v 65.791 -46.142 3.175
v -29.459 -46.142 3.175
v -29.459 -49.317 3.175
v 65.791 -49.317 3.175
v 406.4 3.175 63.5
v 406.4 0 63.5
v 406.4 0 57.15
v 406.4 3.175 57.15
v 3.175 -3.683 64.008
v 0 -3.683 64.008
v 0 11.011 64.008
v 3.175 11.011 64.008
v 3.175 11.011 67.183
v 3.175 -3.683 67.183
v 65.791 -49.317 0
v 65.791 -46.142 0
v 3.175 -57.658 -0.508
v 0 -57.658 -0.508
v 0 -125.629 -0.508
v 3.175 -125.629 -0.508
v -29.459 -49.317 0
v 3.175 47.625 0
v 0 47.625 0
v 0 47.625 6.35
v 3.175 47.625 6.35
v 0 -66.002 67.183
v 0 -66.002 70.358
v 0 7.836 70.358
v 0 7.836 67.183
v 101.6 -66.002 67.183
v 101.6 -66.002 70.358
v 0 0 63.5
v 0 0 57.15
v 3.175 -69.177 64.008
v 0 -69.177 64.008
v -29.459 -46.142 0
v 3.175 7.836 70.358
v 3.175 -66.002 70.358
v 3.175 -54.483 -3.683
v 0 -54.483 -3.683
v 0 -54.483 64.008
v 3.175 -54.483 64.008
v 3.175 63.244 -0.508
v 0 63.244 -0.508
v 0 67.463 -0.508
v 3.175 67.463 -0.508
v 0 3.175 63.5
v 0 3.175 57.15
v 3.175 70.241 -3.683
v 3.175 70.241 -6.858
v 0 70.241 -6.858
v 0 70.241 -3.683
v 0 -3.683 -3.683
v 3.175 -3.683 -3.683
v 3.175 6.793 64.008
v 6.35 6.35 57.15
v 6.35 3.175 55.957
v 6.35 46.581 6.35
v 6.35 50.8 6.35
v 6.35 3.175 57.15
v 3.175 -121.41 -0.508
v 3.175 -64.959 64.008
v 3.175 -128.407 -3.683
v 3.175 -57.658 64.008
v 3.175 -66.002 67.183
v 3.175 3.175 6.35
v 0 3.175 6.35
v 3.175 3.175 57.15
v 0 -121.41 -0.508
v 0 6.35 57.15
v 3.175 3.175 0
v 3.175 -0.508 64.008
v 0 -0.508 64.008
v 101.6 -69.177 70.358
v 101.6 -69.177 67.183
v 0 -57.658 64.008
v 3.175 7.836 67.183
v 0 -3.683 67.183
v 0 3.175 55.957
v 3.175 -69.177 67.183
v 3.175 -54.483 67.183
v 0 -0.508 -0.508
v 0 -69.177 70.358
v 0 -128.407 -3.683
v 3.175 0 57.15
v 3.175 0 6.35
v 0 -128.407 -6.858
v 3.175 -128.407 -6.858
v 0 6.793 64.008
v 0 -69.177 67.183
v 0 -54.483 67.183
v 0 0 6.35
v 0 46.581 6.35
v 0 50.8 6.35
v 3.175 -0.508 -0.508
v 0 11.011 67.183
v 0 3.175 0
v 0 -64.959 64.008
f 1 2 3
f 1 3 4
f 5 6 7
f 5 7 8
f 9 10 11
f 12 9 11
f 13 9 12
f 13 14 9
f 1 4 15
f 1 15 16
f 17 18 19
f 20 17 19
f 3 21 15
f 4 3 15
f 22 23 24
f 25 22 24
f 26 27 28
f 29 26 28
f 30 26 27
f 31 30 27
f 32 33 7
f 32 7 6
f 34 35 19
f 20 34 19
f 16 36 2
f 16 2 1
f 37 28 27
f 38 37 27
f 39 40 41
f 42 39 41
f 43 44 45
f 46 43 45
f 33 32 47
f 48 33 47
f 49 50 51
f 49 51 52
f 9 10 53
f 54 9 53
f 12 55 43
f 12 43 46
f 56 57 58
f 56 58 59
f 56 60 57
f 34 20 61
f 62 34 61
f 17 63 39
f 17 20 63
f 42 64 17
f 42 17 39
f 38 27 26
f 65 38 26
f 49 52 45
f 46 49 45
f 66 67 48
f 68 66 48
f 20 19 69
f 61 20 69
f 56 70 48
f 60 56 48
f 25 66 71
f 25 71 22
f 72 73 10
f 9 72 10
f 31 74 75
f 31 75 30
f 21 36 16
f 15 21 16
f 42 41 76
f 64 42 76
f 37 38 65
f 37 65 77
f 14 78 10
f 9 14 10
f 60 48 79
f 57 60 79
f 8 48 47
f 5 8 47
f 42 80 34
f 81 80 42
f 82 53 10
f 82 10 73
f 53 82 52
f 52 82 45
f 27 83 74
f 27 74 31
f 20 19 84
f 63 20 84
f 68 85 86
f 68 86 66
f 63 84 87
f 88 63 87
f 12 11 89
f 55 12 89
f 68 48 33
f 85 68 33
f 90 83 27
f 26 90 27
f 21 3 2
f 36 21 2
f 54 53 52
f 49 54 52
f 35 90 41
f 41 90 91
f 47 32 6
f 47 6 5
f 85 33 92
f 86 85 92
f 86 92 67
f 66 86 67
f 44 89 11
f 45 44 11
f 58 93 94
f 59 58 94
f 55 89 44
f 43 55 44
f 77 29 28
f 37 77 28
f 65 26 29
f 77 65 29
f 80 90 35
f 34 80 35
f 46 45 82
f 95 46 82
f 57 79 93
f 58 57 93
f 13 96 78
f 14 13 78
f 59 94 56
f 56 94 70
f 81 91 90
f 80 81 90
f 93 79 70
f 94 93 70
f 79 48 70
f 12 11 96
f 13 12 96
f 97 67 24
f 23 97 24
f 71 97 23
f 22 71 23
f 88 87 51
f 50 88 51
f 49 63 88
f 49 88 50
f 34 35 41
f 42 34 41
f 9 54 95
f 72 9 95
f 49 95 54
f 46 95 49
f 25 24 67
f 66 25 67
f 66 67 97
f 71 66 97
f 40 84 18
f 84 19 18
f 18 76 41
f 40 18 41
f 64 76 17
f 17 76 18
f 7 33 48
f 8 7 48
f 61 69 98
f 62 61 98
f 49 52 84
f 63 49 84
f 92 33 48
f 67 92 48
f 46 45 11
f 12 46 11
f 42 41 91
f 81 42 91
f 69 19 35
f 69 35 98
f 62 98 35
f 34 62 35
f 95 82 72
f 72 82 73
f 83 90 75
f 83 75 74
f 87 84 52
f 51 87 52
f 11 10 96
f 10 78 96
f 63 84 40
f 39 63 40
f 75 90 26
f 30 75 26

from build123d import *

# Parameters (mm, degrees)
F1_DEPTH  = 3.175
F0_W      = 3.175
F0_H      = 6.35
F2_DEPTH  = 406.4
F3_DEPTH  = 3.175
F4_DEPTH  = 6.35
F6_DEPTH  = 3.175
F7_DEPTH  = 3.175
F8_DEPTH  = 3.175
F9_DEPTH  = 3.175
F10_DEPTH = 3.175
F5_W      = 3.175
F5_H      = 3.175
F11_DEPTH = 101.6
F12_W     = 95.25
F12_H     = 3.175
F13_DEPTH = 3.175


with BuildPart() as f1:
    # F0 (on Right) → F1 (new body)
    with BuildSketch(Plane.YZ):
        Polygon((0, 57.15), (0, 6.35), (3.175, 6.35), (3.175, 55.957041), (3.175, 57.15), align=None)
    extrude(amount=F1_DEPTH)


with BuildPart() as f2:
    # F0 (on Right) → F2 (new body)
    with BuildSketch(Plane.YZ):
        with Locations((1.5875, 60.325)):
            Rectangle(F0_W, F0_H)
    extrude(amount=F2_DEPTH)


with BuildPart() as f3:
    # F0 (on Right) → F3 (new body)
    with BuildSketch(Plane.YZ):
        Polygon((3.175, 6.35), (3.175, 0), (47.625, 0), (47.625, 6.35), (46.581161, 6.35), align=None)
    extrude(amount=F3_DEPTH)


with BuildPart() as f4:
    # F0 (on Right) → F4 (new body)
    with BuildSketch(Plane.YZ):
        Polygon((3.175, 55.957041), (46.581161, 6.35), (47.625, 6.35), (50.8, 6.35), (6.35, 57.15), (3.175, 57.15), align=None)
    extrude(amount=F4_DEPTH)


with BuildPart() as f6:
    # F5 (on face) → F6 (new body)
    with BuildSketch(Plane.YZ):
        Polygon((-3.683, 64.008), (-0.508, 64.008), (6.792539, 64.008), (11.011378, 64.008), (11.011378, 67.183), (7.836378, 67.183), (-3.683, 67.183), align=None)
        Polygon((-54.482988, 64.008), (-54.482988, 67.183), (-66.002366, 67.183), (-69.177366, 67.183), (-69.177366, 64.008), (-64.958527, 64.008), (-57.657988, 64.008), align=None)
    extrude(amount=F6_DEPTH)


with BuildPart() as f7:
    # F5 (on face) → F7 (new body)
    with BuildSketch(Plane.YZ):
        Polygon((70.241003, -3.683), (-3.683, -3.683), (-54.482988, -3.683), (-128.406991, -3.683), (-128.406991, -6.858), (70.241003, -6.858), align=None)
    extrude(amount=F7_DEPTH)


with BuildPart() as f8:
    # F5 (on face) → F8 (new body)
    with BuildSketch(Plane.YZ):
        Polygon((-0.508, -0.508), (-0.508, 64.008), (-3.683, 64.008), (-3.683, -3.683), (70.241003, -3.683), (67.462878, -0.508), (63.244039, -0.508), align=None)
        Polygon((-128.406991, -3.683), (-54.482988, -3.683), (-54.482988, 64.008), (-57.657988, 64.008), (-57.657988, -0.508), (-121.410027, -0.508), (-125.628866, -0.508), align=None)
    extrude(amount=F8_DEPTH)


with BuildPart() as f9:
    # F5 (on face) → F9 (new body)
    with BuildSketch(Plane.YZ):
        Polygon((11.011378, 64.008), (6.792539, 64.008), (63.244039, -0.508), (67.462878, -0.508), align=None)
        Polygon((-69.177366, 64.008), (-125.628866, -0.508), (-121.410027, -0.508), (-64.958527, 64.008), align=None)
    extrude(amount=F9_DEPTH)


with BuildPart() as f10:
    # F5 (on face) → F10 (new body)
    with BuildSketch(Plane.YZ):
        Polygon((-54.482988, 67.183), (-3.683, 67.183), (7.836378, 67.183), (7.836378, 70.358), (-66.002366, 70.358), (-66.002366, 67.183), align=None)
    extrude(amount=F10_DEPTH)


with BuildPart() as f11:
    # F5 (on face) → F11 (new body)
    with BuildSketch(Plane.YZ):
        with Locations((-67.589866, 68.7705)):
            Rectangle(F5_W, F5_H)
    extrude(amount=F11_DEPTH)


with BuildPart() as f13:
    # F12 (on Top) → F13 (new body)
    with BuildSketch(Plane.XY):
        with Locations((18.165984, -47.729536)):
            Rectangle(F12_W, F12_H)
    extrude(amount=F13_DEPTH)


solid = Compound([f1.part, f2.part, f3.part, f4.part, f6.part, f7.part, f8.part, f9.part, f10.part, f11.part, f13.part])
